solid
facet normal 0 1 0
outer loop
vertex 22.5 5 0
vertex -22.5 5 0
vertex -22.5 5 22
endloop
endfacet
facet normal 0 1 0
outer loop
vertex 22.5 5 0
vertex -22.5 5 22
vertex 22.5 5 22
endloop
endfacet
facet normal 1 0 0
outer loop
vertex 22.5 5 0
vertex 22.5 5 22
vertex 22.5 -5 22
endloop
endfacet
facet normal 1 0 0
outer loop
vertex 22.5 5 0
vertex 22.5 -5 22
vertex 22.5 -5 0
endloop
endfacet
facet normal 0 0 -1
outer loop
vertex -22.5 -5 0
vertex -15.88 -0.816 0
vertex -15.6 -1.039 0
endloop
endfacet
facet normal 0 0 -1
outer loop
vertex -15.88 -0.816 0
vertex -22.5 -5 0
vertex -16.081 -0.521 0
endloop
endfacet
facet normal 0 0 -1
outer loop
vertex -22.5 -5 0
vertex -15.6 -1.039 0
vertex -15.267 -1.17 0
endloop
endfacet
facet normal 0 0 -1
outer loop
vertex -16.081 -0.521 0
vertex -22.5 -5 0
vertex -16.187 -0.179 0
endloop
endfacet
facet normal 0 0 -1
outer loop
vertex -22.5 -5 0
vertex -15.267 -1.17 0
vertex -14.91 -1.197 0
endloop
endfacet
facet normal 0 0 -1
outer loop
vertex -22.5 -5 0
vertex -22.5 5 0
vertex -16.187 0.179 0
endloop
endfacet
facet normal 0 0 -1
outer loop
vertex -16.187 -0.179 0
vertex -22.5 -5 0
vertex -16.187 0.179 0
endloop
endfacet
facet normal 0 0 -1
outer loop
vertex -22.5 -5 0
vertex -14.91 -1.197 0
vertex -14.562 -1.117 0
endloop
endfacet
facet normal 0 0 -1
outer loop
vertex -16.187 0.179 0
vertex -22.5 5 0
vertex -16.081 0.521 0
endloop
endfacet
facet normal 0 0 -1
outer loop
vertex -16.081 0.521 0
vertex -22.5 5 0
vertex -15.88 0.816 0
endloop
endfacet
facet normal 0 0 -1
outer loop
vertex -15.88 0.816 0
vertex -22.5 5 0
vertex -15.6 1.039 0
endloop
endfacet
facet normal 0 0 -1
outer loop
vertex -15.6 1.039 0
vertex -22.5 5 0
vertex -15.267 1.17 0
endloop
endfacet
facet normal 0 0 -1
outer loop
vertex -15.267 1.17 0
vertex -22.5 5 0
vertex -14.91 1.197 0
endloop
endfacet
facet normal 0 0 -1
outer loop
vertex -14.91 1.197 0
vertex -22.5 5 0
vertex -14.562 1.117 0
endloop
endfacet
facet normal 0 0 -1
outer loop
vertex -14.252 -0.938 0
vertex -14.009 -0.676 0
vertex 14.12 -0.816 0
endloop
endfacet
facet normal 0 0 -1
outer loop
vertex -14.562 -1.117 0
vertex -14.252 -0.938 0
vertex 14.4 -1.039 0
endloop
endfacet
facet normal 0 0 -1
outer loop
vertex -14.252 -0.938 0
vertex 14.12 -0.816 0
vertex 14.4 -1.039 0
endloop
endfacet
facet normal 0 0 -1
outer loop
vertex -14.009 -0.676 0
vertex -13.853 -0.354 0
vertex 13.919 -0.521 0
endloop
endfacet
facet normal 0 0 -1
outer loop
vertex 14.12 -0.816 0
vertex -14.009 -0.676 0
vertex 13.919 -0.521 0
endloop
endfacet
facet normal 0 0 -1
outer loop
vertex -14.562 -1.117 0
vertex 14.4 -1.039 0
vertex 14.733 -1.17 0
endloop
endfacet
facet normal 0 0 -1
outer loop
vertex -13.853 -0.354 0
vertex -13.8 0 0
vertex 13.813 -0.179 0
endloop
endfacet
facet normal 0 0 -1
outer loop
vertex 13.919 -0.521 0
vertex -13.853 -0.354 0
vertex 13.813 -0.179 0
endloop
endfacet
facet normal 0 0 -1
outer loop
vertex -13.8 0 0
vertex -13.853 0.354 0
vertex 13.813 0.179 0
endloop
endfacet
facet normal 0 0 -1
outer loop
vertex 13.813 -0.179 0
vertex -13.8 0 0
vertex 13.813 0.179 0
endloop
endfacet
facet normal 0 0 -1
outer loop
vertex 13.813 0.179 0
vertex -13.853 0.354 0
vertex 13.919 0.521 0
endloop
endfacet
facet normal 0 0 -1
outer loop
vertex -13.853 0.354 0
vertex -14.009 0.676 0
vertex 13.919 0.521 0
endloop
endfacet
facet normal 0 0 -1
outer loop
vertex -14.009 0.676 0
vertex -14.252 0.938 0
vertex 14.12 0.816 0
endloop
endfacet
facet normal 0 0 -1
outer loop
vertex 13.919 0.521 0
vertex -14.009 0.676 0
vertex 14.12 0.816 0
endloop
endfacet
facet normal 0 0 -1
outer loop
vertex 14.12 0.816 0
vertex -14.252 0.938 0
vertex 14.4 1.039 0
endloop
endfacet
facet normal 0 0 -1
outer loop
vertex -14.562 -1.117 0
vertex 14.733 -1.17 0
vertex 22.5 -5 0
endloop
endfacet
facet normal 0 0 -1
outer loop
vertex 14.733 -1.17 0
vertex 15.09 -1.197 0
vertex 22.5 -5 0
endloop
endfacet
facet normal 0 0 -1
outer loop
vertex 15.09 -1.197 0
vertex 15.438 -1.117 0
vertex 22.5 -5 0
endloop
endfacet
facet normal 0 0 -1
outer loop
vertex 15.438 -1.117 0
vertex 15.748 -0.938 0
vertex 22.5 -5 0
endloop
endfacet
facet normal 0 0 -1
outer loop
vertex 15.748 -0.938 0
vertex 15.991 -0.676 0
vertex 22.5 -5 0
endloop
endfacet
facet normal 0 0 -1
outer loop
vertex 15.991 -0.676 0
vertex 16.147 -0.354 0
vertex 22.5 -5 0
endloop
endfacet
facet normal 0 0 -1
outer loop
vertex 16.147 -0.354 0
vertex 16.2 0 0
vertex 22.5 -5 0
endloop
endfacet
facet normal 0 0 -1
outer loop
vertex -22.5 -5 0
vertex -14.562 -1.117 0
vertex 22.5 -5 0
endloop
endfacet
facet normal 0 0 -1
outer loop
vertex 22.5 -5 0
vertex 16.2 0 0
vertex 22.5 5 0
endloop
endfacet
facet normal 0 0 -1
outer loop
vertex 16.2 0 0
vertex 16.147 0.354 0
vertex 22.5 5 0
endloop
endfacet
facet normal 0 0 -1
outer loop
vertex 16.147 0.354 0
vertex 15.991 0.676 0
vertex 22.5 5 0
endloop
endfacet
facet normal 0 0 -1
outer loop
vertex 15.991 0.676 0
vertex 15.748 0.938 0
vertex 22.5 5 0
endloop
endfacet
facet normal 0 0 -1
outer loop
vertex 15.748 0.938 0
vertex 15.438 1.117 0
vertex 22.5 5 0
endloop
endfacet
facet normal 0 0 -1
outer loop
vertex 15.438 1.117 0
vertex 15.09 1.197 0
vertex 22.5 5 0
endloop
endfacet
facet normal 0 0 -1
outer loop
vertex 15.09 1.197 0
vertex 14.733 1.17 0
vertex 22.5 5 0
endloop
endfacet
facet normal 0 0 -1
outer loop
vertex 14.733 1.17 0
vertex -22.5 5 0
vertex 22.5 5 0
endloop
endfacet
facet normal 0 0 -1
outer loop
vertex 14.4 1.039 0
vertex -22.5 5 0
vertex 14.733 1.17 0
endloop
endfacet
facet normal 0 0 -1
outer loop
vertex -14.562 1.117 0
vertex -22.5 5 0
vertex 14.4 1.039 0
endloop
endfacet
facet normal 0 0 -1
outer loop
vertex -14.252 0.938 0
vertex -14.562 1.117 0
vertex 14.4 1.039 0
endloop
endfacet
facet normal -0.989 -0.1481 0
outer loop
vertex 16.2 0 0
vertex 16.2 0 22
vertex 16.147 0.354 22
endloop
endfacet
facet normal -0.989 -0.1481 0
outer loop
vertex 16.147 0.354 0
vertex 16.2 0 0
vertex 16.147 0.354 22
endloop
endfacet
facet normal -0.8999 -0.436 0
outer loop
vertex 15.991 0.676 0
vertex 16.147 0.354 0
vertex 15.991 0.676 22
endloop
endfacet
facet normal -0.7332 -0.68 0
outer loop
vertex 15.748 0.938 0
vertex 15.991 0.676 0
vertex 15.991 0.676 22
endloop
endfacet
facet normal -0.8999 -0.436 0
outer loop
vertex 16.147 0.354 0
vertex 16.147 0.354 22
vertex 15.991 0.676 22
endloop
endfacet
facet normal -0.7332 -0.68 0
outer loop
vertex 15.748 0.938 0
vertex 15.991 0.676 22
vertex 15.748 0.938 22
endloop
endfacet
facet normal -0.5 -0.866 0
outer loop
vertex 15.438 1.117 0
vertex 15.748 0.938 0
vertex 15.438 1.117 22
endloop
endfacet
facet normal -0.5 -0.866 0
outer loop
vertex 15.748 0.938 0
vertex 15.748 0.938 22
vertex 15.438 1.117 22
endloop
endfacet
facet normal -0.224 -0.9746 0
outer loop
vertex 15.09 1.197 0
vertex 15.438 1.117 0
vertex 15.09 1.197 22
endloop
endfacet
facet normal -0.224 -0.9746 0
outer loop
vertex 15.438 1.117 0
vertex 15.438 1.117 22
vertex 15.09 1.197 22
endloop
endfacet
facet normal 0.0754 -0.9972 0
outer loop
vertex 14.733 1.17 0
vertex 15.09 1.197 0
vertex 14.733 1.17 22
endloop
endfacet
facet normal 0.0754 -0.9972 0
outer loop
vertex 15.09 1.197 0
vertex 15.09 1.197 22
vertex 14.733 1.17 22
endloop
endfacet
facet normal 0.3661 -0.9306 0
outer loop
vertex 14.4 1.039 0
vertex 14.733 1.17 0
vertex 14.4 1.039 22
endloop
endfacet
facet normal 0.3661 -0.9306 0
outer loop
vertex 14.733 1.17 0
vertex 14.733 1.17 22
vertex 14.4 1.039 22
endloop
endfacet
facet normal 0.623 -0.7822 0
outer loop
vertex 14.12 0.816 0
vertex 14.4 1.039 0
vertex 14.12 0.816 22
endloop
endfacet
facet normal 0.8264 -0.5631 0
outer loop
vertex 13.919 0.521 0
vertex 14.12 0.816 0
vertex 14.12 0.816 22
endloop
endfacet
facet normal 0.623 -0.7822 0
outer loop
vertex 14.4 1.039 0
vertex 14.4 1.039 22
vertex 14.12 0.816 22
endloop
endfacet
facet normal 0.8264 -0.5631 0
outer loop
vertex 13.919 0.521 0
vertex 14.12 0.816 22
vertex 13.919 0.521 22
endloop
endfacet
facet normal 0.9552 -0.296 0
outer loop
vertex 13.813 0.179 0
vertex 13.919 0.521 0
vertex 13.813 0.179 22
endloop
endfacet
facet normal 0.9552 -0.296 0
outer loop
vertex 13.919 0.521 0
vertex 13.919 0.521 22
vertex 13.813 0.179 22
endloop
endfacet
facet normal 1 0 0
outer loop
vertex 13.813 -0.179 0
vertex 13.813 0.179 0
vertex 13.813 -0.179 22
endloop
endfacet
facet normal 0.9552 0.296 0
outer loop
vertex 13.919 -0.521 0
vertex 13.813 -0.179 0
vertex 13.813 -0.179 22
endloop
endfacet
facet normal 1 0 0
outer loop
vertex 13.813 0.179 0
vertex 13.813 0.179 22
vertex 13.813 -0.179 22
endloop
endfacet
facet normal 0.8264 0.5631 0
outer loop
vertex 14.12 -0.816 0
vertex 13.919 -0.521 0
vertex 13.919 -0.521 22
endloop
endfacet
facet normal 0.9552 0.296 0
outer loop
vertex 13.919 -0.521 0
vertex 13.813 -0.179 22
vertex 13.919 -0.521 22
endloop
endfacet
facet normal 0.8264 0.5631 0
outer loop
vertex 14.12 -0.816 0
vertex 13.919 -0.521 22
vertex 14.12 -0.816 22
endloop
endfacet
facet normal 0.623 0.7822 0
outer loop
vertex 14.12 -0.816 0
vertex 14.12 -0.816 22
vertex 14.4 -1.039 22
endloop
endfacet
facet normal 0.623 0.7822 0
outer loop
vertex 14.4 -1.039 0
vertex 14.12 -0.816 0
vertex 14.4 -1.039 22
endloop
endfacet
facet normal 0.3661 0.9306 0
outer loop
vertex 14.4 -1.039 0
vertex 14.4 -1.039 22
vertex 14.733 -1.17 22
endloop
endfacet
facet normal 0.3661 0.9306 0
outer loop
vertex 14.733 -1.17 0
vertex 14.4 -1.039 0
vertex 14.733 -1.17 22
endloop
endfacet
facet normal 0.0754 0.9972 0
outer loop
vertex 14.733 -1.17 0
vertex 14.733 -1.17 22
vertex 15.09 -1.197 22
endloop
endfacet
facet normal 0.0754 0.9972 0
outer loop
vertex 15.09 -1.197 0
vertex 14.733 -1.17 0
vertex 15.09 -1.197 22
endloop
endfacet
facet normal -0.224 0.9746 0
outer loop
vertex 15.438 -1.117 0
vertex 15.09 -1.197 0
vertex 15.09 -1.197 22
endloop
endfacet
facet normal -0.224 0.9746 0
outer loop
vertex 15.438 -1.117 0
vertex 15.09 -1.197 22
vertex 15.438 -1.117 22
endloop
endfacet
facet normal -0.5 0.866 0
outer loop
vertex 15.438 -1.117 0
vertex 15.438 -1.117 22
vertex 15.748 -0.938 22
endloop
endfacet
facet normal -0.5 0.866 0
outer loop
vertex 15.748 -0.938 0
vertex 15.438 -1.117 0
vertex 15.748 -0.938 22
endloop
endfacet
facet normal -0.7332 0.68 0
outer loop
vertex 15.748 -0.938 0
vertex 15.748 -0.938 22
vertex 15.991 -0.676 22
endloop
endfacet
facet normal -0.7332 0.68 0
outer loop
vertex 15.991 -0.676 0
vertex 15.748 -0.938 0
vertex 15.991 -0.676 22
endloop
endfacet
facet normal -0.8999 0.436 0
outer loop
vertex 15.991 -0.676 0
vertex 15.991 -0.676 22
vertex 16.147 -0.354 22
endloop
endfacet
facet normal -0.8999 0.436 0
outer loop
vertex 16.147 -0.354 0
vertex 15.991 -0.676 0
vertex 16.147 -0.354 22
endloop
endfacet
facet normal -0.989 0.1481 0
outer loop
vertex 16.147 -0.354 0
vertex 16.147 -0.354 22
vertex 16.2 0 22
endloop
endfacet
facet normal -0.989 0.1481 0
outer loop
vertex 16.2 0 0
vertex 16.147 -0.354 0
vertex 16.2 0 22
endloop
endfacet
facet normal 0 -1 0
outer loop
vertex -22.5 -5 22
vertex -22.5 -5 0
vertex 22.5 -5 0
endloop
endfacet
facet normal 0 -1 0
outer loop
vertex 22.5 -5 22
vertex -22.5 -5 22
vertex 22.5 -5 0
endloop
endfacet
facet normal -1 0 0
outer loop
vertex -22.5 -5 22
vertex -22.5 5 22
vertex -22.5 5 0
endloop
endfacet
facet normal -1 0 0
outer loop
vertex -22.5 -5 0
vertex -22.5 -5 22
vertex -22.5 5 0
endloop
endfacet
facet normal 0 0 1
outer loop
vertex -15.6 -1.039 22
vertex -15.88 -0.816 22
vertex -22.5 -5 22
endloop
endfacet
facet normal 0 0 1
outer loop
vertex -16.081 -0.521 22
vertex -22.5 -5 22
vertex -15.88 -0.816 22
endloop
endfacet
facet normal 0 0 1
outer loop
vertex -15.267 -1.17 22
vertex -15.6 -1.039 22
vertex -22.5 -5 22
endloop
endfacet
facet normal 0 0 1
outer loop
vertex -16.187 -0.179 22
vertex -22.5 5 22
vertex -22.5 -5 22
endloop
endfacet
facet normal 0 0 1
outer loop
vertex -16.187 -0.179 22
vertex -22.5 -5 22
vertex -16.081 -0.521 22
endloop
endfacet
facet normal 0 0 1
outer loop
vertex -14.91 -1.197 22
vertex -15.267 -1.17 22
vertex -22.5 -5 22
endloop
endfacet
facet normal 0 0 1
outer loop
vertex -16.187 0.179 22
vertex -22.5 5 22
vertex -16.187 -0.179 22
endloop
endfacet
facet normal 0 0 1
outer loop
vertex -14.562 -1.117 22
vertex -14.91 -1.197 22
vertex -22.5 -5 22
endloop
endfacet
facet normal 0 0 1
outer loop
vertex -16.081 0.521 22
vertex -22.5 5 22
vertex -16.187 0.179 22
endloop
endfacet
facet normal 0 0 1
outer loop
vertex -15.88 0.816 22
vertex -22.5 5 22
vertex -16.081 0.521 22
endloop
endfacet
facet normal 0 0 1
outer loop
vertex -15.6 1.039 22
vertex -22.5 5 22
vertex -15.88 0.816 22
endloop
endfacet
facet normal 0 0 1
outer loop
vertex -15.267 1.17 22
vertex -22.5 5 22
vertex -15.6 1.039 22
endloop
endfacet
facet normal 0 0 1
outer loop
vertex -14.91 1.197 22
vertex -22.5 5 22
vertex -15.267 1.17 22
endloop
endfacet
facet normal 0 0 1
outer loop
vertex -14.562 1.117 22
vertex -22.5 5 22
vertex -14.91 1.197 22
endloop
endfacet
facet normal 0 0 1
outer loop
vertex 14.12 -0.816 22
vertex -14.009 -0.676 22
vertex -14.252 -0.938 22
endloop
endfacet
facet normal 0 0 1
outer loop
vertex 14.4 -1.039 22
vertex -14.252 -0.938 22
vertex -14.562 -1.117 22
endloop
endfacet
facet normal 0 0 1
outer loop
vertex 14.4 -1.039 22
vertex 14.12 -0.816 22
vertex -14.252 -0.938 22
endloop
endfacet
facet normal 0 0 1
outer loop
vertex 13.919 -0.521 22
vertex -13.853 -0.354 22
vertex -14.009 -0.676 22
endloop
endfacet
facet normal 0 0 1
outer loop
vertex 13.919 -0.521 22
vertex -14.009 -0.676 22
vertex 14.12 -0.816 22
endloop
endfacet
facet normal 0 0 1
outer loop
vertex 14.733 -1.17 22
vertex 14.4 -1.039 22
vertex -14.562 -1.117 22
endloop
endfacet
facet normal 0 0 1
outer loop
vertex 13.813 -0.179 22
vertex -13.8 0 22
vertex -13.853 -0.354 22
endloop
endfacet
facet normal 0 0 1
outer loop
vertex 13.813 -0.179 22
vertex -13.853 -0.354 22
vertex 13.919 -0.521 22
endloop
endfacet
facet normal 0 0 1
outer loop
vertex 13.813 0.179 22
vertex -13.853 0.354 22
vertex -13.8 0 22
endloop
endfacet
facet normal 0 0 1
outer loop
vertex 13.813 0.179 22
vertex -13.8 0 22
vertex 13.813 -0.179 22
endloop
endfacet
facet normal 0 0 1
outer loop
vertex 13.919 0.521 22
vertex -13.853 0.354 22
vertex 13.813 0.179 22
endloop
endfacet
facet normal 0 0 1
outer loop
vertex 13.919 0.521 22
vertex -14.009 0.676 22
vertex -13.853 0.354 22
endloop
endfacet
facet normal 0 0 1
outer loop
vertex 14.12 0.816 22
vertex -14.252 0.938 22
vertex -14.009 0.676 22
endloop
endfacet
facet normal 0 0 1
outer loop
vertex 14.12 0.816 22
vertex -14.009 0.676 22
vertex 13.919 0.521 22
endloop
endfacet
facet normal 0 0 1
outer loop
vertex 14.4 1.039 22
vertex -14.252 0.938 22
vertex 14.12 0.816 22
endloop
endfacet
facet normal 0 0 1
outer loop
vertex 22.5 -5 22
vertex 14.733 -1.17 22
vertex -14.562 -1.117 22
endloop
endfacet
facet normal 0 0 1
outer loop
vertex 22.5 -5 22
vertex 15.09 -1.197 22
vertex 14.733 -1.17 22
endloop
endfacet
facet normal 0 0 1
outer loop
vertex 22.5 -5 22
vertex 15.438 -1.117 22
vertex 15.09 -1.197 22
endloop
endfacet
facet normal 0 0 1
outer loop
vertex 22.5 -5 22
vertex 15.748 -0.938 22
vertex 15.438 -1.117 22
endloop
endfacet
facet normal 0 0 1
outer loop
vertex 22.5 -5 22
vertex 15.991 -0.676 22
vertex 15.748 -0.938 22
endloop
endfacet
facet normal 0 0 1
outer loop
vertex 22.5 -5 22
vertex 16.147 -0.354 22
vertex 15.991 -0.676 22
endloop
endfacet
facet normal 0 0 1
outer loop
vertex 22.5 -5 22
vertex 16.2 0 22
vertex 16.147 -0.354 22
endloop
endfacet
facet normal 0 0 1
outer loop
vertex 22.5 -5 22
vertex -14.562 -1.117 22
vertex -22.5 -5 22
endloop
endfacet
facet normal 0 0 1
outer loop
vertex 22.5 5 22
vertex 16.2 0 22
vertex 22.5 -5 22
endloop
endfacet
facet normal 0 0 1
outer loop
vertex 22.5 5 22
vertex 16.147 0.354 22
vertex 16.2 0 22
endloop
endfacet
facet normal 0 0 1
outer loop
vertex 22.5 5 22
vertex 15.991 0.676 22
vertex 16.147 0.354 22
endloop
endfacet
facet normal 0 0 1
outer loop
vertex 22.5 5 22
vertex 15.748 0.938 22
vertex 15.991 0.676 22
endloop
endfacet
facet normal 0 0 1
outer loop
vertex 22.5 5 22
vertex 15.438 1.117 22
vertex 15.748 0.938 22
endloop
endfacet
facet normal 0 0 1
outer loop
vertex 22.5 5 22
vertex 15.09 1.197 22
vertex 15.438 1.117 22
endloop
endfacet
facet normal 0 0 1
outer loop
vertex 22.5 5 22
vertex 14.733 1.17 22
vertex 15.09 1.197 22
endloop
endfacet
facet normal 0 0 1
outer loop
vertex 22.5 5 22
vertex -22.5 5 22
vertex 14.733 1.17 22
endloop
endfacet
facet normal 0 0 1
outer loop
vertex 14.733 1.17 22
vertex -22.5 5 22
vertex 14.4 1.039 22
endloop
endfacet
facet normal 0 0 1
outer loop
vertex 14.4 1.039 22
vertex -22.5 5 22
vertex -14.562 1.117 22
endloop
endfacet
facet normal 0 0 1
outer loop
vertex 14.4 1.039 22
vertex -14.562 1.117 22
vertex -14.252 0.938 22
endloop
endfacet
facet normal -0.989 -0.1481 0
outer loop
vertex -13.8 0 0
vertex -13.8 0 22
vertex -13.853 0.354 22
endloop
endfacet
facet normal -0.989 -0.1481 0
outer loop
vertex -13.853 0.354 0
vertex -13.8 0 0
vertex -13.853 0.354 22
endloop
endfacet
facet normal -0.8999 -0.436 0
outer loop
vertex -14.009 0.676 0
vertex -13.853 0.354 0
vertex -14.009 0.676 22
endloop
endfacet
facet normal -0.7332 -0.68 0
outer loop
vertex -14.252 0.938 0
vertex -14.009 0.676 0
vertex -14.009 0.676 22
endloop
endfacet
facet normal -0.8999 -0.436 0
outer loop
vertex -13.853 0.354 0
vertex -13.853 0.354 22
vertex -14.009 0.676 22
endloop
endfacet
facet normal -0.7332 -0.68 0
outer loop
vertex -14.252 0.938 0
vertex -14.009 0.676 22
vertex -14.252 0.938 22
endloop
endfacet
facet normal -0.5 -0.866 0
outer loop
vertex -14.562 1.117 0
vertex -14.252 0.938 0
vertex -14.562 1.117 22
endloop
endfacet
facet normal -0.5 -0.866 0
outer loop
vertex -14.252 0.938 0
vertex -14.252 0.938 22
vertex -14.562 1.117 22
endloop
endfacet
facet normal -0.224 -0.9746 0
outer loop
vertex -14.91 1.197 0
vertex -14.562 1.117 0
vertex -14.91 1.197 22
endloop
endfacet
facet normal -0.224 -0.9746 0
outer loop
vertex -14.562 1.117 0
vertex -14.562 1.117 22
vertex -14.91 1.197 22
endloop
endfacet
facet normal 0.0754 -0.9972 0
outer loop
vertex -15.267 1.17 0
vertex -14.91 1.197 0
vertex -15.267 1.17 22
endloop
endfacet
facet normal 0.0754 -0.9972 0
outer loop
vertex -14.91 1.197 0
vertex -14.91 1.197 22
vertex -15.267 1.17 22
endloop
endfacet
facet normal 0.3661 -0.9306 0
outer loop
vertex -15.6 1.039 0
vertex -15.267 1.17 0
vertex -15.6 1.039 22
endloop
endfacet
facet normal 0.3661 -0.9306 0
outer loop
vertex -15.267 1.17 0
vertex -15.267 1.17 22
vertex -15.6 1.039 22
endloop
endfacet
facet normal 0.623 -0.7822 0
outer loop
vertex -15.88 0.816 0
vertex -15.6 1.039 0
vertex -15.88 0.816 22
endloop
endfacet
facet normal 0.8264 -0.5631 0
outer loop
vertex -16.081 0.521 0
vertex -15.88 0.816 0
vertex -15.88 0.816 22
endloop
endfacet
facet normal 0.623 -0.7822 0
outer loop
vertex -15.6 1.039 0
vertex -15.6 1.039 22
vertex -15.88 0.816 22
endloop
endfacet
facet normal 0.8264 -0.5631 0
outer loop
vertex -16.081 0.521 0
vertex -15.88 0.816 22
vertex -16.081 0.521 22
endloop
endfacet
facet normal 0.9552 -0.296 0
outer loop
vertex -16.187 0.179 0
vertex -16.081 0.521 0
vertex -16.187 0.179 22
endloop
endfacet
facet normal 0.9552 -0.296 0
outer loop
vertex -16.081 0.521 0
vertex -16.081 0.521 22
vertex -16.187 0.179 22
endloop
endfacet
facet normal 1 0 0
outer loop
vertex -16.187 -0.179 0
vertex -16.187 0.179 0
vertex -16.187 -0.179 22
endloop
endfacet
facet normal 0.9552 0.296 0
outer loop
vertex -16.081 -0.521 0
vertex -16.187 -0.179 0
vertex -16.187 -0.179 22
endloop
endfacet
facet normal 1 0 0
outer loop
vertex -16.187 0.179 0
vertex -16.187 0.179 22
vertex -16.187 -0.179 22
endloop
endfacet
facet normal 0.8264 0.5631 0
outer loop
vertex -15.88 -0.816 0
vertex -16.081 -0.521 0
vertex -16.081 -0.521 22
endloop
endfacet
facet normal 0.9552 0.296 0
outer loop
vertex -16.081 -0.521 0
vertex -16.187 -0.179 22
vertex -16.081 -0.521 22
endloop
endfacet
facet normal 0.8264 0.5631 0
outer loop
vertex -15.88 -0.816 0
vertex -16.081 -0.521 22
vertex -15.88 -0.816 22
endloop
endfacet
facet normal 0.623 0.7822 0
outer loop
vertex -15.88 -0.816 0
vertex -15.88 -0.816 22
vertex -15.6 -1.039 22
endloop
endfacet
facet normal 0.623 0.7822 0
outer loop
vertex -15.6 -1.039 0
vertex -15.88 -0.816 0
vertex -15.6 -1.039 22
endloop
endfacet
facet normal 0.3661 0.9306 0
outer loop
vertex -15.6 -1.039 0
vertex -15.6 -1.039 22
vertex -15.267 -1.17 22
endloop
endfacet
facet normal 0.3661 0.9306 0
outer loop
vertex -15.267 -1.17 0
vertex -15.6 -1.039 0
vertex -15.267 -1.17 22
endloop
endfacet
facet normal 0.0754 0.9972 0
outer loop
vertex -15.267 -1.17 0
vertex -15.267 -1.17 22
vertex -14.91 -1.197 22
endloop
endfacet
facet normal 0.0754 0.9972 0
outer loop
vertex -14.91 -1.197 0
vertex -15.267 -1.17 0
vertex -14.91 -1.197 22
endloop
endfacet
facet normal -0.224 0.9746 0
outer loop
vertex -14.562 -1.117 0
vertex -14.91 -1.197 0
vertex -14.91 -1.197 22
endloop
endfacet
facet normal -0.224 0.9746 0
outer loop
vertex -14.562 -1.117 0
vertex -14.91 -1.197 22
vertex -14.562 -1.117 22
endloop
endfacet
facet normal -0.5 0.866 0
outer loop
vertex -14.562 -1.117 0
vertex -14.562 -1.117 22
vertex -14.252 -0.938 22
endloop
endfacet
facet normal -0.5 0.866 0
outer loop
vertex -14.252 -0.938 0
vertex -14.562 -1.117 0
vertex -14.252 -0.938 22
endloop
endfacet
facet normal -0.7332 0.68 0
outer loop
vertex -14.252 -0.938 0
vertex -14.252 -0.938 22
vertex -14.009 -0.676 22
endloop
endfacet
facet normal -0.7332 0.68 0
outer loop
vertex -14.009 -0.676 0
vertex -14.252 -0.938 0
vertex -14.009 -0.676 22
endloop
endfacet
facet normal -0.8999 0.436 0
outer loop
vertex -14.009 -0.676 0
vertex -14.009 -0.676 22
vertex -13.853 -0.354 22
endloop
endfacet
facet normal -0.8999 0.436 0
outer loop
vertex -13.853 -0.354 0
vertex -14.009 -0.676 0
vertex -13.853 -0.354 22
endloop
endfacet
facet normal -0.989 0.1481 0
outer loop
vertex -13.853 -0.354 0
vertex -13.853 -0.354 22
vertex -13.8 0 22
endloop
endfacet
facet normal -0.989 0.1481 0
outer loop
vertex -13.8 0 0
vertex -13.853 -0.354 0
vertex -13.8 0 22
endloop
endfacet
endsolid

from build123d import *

# Parameters (mm, degrees)
ESQUISSE1_W             = 45
ESQUISSE1_H             = 22
BOSS_EXTRU_1_DEPTH      = 5
ESQUISSE2_R             = 1.2
ENL_V_MAT_EXTRU_1_DEPTH = 32.862987933


with BuildPart() as part:
    # Esquisse1 → Boss.-Extru.1 (new, symmetric)
    with BuildSketch(Plane(origin=(0, 0, 0), x_dir=(1, 0, 0), z_dir=(0, 1, 0))):
        with Locations((0, -11)):
            Rectangle(ESQUISSE1_W, ESQUISSE1_H)
    extrude(amount=BOSS_EXTRU_1_DEPTH, both=True)

    # Esquisse2 → Enlèv. mat.-Extru.1 (cut, through all)
    with BuildSketch(Plane.XY.offset(22)):
        with Locations((-15, 0)):
            Circle(ESQUISSE2_R)
        with Locations((15, 0)):
            Circle(ESQUISSE2_R)
    extrude(amount=-ENL_V_MAT_EXTRU_1_DEPTH, mode=Mode.SUBTRACT)


solid = part.part
